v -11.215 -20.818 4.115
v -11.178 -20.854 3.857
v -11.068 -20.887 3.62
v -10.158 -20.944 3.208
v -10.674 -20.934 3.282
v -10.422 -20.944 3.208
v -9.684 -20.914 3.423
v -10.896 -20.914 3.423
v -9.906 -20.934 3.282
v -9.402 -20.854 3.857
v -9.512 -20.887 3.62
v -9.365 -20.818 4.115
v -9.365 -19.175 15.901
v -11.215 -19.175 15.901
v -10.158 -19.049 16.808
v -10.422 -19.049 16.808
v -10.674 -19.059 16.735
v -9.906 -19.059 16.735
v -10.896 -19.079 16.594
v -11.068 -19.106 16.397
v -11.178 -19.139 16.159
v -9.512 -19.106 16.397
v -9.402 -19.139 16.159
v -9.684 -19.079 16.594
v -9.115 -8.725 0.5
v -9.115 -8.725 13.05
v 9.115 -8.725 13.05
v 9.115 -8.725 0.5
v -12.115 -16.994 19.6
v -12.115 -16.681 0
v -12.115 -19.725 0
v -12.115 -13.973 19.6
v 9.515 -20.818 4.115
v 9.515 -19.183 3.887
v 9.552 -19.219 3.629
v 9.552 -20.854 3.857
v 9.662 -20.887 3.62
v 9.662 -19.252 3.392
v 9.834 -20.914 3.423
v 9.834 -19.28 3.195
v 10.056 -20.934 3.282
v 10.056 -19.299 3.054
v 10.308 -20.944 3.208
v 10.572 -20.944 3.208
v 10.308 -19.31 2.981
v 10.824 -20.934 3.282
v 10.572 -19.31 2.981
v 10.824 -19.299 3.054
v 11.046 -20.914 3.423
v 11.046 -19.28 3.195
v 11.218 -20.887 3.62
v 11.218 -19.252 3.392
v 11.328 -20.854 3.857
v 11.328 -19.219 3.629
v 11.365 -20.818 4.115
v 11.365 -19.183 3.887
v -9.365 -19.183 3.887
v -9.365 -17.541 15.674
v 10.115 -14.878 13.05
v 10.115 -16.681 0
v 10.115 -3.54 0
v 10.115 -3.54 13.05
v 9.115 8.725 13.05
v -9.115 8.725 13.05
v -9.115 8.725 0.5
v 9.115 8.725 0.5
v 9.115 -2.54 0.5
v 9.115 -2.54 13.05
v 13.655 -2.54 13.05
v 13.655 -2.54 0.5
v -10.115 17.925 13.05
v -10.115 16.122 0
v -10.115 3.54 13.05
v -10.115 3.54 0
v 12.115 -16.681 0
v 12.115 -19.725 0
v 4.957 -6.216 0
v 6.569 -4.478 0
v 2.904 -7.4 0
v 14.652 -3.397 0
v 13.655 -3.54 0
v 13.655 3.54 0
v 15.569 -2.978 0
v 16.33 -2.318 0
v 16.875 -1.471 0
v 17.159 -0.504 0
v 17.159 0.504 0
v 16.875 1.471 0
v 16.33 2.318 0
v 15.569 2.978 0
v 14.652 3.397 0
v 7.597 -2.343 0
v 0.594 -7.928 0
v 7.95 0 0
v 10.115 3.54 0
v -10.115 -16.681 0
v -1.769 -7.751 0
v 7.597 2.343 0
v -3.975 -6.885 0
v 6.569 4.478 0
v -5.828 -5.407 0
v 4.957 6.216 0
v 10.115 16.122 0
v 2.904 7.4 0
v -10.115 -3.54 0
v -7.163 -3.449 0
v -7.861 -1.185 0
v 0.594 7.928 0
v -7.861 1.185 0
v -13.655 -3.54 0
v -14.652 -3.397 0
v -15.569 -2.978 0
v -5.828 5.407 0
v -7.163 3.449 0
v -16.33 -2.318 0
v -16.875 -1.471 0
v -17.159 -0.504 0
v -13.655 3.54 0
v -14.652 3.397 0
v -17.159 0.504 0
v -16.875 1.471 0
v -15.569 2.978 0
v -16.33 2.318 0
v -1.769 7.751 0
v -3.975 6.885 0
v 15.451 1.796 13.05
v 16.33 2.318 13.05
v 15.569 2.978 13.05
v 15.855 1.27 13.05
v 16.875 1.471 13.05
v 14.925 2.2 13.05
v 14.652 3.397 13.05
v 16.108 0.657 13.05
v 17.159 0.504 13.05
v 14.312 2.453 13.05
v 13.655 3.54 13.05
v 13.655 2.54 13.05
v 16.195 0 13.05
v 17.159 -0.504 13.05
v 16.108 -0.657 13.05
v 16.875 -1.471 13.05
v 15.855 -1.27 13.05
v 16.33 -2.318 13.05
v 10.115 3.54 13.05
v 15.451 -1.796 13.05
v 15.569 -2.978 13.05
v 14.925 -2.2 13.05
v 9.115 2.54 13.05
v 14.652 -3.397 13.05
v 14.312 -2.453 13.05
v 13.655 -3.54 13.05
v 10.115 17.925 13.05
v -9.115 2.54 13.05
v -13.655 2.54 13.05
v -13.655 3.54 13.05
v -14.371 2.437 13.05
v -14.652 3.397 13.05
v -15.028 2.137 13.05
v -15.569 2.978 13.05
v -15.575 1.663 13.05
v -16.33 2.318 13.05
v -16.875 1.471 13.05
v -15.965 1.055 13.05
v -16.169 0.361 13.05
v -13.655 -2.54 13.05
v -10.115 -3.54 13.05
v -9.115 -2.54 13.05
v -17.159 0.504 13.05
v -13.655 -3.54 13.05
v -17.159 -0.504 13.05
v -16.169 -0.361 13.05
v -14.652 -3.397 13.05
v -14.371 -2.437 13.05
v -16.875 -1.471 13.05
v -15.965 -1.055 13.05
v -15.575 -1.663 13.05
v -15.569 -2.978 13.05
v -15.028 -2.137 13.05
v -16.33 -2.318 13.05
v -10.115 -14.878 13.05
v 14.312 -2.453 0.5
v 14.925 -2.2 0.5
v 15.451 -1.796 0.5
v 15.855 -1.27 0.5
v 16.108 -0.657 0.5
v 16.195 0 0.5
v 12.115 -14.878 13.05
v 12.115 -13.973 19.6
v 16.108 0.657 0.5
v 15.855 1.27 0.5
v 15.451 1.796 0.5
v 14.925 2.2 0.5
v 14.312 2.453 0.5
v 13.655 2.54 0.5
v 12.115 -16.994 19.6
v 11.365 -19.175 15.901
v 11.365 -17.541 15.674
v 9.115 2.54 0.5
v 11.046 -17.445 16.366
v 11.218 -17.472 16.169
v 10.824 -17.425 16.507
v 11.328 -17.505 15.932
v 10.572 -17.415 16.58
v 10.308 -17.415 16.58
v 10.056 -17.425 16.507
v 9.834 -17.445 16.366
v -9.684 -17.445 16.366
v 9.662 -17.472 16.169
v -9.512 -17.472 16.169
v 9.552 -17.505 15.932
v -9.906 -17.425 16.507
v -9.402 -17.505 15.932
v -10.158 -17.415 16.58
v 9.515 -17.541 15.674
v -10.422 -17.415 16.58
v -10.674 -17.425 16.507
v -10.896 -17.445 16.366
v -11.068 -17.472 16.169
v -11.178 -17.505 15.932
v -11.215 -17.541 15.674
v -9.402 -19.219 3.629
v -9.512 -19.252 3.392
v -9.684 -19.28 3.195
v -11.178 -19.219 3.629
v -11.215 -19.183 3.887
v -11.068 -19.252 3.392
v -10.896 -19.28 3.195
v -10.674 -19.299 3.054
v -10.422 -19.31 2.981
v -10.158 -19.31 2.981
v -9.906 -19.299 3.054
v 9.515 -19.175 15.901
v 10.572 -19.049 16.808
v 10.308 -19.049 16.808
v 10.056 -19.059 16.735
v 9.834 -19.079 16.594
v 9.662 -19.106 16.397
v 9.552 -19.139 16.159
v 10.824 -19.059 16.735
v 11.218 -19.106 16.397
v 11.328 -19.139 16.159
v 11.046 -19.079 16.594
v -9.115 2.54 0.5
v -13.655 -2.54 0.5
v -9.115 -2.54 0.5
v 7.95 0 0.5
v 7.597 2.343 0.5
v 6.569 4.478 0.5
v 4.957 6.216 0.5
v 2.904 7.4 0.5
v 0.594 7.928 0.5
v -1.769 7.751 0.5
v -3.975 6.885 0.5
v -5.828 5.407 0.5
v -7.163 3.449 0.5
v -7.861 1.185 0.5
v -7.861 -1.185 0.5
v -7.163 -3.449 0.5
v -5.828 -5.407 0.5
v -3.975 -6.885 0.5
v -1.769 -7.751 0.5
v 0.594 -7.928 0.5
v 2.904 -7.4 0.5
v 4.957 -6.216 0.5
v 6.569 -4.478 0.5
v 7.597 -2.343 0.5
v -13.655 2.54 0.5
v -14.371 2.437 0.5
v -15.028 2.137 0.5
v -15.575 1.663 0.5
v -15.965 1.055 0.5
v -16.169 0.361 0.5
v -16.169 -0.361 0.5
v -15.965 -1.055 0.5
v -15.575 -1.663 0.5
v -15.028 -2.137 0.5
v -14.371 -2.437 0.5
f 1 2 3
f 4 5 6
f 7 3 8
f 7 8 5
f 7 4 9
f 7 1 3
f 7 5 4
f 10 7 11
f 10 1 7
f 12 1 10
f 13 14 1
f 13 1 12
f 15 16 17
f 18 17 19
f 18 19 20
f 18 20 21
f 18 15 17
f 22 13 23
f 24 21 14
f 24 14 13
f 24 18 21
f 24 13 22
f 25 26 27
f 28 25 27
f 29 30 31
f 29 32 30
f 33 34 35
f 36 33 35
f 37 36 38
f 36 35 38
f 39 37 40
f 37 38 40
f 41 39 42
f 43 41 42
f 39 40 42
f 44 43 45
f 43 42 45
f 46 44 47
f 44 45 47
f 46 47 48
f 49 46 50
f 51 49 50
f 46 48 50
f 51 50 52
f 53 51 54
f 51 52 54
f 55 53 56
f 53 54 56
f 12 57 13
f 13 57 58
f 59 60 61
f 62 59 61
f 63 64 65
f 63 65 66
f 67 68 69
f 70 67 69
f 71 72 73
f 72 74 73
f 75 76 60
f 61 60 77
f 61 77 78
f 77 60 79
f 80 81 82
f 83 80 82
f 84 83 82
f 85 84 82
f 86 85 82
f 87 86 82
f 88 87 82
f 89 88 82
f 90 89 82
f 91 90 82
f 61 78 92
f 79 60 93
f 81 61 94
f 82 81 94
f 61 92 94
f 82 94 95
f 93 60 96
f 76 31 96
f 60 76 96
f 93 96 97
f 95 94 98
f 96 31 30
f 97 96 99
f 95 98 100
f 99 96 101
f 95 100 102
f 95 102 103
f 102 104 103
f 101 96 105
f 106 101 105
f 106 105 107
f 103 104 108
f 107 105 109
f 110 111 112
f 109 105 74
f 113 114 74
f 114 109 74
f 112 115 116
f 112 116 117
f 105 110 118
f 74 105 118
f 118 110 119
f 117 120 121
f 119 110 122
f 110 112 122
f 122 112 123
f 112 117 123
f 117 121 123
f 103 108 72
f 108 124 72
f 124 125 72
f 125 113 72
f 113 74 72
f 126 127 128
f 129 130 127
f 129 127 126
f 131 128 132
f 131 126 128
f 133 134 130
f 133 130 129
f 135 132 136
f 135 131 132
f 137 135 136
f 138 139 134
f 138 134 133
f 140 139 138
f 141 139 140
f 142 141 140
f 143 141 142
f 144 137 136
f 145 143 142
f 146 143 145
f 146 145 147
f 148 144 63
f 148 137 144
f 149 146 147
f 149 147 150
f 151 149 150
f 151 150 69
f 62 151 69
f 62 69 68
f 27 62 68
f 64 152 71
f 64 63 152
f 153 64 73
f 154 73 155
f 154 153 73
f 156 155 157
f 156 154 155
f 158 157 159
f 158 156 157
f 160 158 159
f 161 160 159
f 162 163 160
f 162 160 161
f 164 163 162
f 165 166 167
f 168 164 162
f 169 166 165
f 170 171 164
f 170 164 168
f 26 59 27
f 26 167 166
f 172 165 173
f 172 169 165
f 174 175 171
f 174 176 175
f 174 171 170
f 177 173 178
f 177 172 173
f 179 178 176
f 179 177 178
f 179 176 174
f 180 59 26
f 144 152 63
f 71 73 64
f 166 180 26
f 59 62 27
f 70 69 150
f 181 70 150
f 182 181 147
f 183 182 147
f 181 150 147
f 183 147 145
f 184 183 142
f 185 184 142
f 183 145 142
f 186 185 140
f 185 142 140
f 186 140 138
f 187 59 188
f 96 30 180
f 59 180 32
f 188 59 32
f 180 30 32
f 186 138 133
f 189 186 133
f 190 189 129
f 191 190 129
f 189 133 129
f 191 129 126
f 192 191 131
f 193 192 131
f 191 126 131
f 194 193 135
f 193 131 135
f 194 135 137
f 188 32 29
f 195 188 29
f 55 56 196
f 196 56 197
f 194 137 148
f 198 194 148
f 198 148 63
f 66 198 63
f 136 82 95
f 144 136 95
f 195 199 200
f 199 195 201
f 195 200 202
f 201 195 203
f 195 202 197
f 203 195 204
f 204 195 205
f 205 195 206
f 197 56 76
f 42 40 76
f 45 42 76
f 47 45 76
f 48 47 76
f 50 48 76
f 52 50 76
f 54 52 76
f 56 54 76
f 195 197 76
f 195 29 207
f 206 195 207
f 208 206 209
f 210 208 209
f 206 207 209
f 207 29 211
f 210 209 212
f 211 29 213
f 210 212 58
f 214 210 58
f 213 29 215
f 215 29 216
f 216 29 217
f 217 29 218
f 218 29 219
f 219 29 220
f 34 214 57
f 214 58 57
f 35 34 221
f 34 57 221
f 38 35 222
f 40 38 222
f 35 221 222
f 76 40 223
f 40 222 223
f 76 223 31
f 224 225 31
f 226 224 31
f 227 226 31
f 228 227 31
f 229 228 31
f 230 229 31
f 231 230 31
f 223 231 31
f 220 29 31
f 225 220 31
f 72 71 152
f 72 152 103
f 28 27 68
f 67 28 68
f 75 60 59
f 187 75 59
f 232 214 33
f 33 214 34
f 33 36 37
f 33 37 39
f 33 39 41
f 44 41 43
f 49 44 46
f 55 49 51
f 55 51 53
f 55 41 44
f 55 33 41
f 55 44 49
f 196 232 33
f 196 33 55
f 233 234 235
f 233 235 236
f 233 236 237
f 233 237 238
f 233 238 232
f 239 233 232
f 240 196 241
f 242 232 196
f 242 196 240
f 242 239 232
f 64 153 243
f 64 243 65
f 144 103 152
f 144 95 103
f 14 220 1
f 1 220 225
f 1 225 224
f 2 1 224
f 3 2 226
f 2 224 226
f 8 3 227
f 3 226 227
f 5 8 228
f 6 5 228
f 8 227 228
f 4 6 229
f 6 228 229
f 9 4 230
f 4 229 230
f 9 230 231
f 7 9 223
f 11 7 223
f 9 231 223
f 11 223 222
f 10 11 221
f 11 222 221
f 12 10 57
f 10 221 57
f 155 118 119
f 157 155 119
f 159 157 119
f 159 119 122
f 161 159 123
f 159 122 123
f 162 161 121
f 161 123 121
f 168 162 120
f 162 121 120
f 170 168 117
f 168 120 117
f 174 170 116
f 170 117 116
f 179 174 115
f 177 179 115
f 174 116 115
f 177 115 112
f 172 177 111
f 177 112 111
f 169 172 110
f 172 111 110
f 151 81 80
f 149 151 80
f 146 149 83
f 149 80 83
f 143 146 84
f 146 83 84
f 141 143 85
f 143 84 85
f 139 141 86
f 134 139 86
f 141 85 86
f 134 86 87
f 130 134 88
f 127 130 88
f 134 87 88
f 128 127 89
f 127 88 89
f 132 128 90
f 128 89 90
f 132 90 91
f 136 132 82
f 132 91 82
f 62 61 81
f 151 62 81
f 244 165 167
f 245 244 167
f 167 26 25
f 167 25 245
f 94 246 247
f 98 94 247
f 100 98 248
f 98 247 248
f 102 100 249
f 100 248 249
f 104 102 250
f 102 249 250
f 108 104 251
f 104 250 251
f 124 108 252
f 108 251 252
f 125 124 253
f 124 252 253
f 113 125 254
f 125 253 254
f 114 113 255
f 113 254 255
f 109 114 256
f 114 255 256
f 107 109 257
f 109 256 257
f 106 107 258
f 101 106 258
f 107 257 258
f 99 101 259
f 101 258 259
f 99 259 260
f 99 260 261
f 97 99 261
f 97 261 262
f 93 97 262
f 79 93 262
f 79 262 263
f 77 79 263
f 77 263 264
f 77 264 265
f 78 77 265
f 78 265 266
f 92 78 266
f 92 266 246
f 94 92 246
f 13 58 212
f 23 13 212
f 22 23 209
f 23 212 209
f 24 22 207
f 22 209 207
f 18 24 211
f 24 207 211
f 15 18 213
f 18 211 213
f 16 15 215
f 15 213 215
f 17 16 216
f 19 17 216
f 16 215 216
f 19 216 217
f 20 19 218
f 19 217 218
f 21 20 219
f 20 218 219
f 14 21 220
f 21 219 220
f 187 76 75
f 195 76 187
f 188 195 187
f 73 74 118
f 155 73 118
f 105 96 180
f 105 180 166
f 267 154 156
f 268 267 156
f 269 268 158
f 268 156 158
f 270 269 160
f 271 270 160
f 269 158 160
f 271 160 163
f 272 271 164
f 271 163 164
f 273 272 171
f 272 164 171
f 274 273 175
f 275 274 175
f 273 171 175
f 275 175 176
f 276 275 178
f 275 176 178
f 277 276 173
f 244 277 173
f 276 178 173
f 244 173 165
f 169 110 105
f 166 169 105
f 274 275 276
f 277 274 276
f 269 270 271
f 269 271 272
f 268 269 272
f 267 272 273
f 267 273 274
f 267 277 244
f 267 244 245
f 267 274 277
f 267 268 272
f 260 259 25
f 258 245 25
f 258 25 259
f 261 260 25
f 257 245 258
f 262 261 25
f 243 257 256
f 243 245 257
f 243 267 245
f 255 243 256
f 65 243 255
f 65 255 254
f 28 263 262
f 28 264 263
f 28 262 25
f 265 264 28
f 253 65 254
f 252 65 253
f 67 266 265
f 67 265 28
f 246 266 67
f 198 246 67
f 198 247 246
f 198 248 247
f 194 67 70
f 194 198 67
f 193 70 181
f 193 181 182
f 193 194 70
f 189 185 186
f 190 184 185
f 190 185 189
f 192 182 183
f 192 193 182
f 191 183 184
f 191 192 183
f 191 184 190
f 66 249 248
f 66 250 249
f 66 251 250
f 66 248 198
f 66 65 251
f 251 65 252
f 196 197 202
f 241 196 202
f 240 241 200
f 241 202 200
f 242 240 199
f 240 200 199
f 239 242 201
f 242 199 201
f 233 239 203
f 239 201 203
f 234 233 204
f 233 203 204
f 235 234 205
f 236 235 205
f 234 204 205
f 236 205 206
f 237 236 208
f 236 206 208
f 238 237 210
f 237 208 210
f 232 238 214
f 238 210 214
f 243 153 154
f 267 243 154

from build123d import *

# Parameters (mm, degrees)
F0_W      = 20.23
F0_H      = 6.185
F1_DEPTH  = 13.05
F2_W      = 18.23
F2_H      = 17.45
F3_DEPTH  = 12.55
F5_DEPTH  = 12.55
F6_R      = 7.95
F7_DEPTH  = 0.501
F8_W      = 20.23
F8_H      = 13.05
F9_DEPTH  = 10
F10_W     = 20.23
F10_H     = 9.9667743579
F11_DEPTH = 25
F13_DEPTH = 27.311
F15_DEPTH = 27.311
F17_W     = 20.23
F17_H     = 13.05
F18_DEPTH = 8.2
F20_DEPTH = 25
F22_DEPTH = 2
F23_DEPTH = 2
F25_DEPTH = 29.311
F27_DEPTH = 1.65


with BuildPart() as f1:
    # F0 (on Top) → F1 (new body)
    with BuildSketch(Plane.XY):
        with Locations((0, -6.6325)):
            Rectangle(F0_W, F0_H)
        Polygon((-10.115, -3.54), (10.115, -3.54), (10.115, 0), (10.115, 3.54), (-10.115, 3.54), (-10.115, 0), align=None)
        with BuildLine():
            Line((10.115, 0), (10.115, -3.54))
            Line((10.115, -3.54), (13.655, -3.54))
            ThreePointArc((13.655, -3.54), (11.1518419946, -2.5031580054), (10.115, 0))
        make_face()
        with BuildLine():
            Line((-13.655, -3.54), (-10.115, -3.54))
            Line((-10.115, -3.54), (-10.115, 0))
            ThreePointArc((-10.115, 0), (-11.1518419946, -2.5031580054), (-13.655, -3.54))
        make_face()
        with BuildLine():
            Line((10.115, 3.54), (10.115, 0))
            ThreePointArc((10.115, 0), (11.1518419946, 2.5031580054), (13.655, 3.54))
            Line((13.655, 3.54), (10.115, 3.54))
        make_face()
        with BuildLine():
            ThreePointArc((13.655, 3.54), (11.1518419946, 2.5031580054), (10.115, 0))
            ThreePointArc((10.115, 0), (11.1518419946, -2.5031580054), (13.655, -3.54))
            Line((13.655, -3.54), (13.655, 3.54))
        make_face()
        with BuildLine():
            Line((13.655, 3.54), (13.655, -3.54))
            ThreePointArc((13.655, -3.54), (16.1581580054, -2.5031580054), (17.195, 0))
            ThreePointArc((17.195, 0), (16.1581580054, 2.5031580054), (13.655, 3.54))
        make_face()
        with BuildLine():
            ThreePointArc((-13.655, 3.54), (-11.1518419946, 2.5031580054), (-10.115, 0))
            Line((-10.115, 0), (-10.115, 3.54))
            Line((-10.115, 3.54), (-13.655, 3.54))
        make_face()
        with BuildLine():
            ThreePointArc((-13.655, -3.54), (-11.1518419946, -2.5031580054), (-10.115, 0))
            ThreePointArc((-10.115, 0), (-11.1518419946, 2.5031580054), (-13.655, 3.54))
            Line((-13.655, 3.54), (-13.655, -3.54))
        make_face()
        with BuildLine():
            ThreePointArc((-13.655, 3.54), (-17.195, 0), (-13.655, -3.54))
            Line((-13.655, -3.54), (-13.655, 3.54))
        make_face()
        with Locations((0, 6.6325)):
            Rectangle(F0_W, F0_H)
    extrude(amount=F1_DEPTH)

    # F2 (on face) → F3 (cut)
    with BuildSketch(Plane.XY.offset(13.05)):
        Rectangle(F2_W, F2_H)
    extrude(amount=-F3_DEPTH, mode=Mode.SUBTRACT)

    # F4 (on face) → F5 (cut)
    with BuildSketch(Plane.XY.offset(13.05)):
        with BuildLine():
            ThreePointArc((-13.655, -2.54), (-11.8589487758, -1.7960512242), (-11.115, 0))
            ThreePointArc((-11.115, 0), (-11.8589487758, 1.7960512242), (-13.655, 2.54))
            Line((-13.655, 2.54), (-13.655, -2.54))
        make_face()
        with BuildLine():
            ThreePointArc((-13.655, 2.54), (-11.8589487758, 1.7960512242), (-11.115, 0))
            ThreePointArc((-11.115, 0), (-11.8589487758, -1.7960512242), (-13.655, -2.54))
            Line((-13.655, -2.54), (13.655, -2.54))
            ThreePointArc((13.655, -2.54), (11.115, 0), (13.655, 2.54))
            Line((13.655, 2.54), (-13.655, 2.54))
        make_face()
        with BuildLine():
            Line((-13.655, -2.54), (-13.655, 2.54))
            ThreePointArc((-13.655, 2.54), (-16.195, 0), (-13.655, -2.54))
        make_face()
        with BuildLine():
            Line((13.655, -2.54), (13.655, 2.54))
            ThreePointArc((13.655, 2.54), (11.115, 0), (13.655, -2.54))
        make_face()
        with BuildLine():
            ThreePointArc((16.195, 0), (15.4510512242, 1.7960512242), (13.655, 2.54))
            Line((13.655, 2.54), (13.655, -2.54))
            ThreePointArc((13.655, -2.54), (15.4510512242, -1.7960512242), (16.195, 0))
        make_face()
    extrude(amount=-F5_DEPTH, mode=Mode.SUBTRACT)

    # F6 (on face) → F7 (cut, through all)
    with BuildSketch(Plane.XY.offset(0.5)):
        Circle(F6_R)
    extrude(amount=-F7_DEPTH, mode=Mode.SUBTRACT)

    # F8 (on face) → F9 (join)
    with BuildSketch(Plane.XZ.offset(9.725)):
        with Locations((0, 6.525)):
            Rectangle(F8_W, F8_H)
    extrude(amount=F9_DEPTH)

    # F10 (on face) → F11 (join)
    with BuildSketch(Plane.XY.offset(13.05)):
        with Locations((0, -14.7416128211)):
            Rectangle(F10_W, F10_H)
    extrude(amount=F11_DEPTH)

    # F12 (on face) → F13 (cut, through all)
    with BuildSketch(Plane(origin=(-10.115, 0, 0), x_dir=(0, -1, 0), z_dir=(-1, 0, 0))):
        Polygon((19.725, 38.05), (14.4232781604, 38.05), (19.725, 0), align=None)
    extrude(amount=-F13_DEPTH, mode=Mode.SUBTRACT)

    # F14 (on face) → F15 (cut, through all)
    with BuildSketch(Plane(origin=(-10.115, 0, 0), x_dir=(0, -1, 0), z_dir=(-1, 0, 0))):
        Polygon((9.7582256421, 13.05), (14.8776879954, 13.05), (11.4232781604, 38.05), (9.7582256421, 38.05), align=None)
    extrude(amount=-F15_DEPTH, mode=Mode.SUBTRACT)

    # F17 (on face) → F18 (join)
    with BuildSketch(Plane(origin=(0, 9.725, 0), x_dir=(-1, 0, 0), z_dir=(0, 1, 0))):
        with Locations((0, 6.525)):
            Rectangle(F17_W, F17_H)
    extrude(amount=F18_DEPTH)

    # F19 (on face) → F20 (cut)
    with BuildSketch(Plane.YZ.offset(10.115)):
        Polygon((17.925, 0), (17.925, 13.05), (16.1217980661, 0), align=None)
    extrude(amount=-F20_DEPTH, mode=Mode.SUBTRACT)

    # F21 (on face) → F22 (join)
    with BuildSketch(Plane(origin=(-10.115, 0, 0), x_dir=(0, -1, 0), z_dir=(-1, 0, 0))):
        Polygon((19.725, 0), (14.4232781604, 38.05), (11.4232781604, 38.05), (16.6808899293, 0), align=None)
    extrude(amount=F22_DEPTH)

    # F16 (on face) → F23 (join)
    with BuildSketch(Plane.YZ.offset(10.115)):
        Polygon((-11.4232781604, 38.05), (-14.4232781604, 38.05), (-19.725, 0), (-16.6808899293, 0), (-14.8776879954, 13.05), align=None)
    extrude(amount=F23_DEPTH)

    # F24 (on face) → F25 (cut, through all)
    with BuildSketch(Plane(origin=(-12.115, 0, 0), x_dir=(0, -1, 0), z_dir=(-1, 0, 0))):
        Polygon((11.4232781604, 38.05), (13.9726326186, 19.6), (16.9940210761, 19.6), (14.4232781604, 38.05), align=None)
    extrude(amount=-F25_DEPTH, mode=Mode.SUBTRACT)

    # F26 (on face) → F27 (join)
    with BuildSketch(Plane(origin=(0, -19.349343601, 2.6960535493), x_dir=(1, 0, 0), z_dir=(0, -0.9904318834, 0.1380024795))):
        with BuildLine():
            ThreePointArc((-11.215, 13.1029010909), (-10.29, 12.1779010909), (-9.365, 13.1029010909))
            ThreePointArc((-9.365, 13.1029010909), (-10.29, 14.0279010909), (-11.215, 13.1029010909))
        make_face()
        with BuildLine():
            Line((-9.365, 1.2029010909), (-9.365, 13.1029010909))
            ThreePointArc((-9.365, 13.1029010909), (-10.29, 12.1779010909), (-11.215, 13.1029010909))
            Line((-11.215, 13.1029010909), (-11.215, 1.2029010909))
            ThreePointArc((-11.215, 1.2029010909), (-10.29, 2.1279010909), (-9.365, 1.2029010909))
        make_face()
        with BuildLine():
            ThreePointArc((-11.215, 1.2029010909), (-10.29, 0.2779010909), (-9.365, 1.2029010909))
            ThreePointArc((-9.365, 1.2029010909), (-10.29, 2.1279010909), (-11.215, 1.2029010909))
        make_face()
        with BuildLine():
            ThreePointArc((9.515, 13.1029010909), (10.44, 12.1779010909), (11.365, 13.1029010909))
            ThreePointArc((11.365, 13.1029010909), (10.44, 14.0279010909), (9.515, 13.1029010909))
        make_face()
        with BuildLine():
            Line((11.365, 1.2029010909), (11.365, 13.1029010909))
            ThreePointArc((11.365, 13.1029010909), (10.44, 12.1779010909), (9.515, 13.1029010909))
            Line((9.515, 13.1029010909), (9.515, 1.2029010909))
            ThreePointArc((9.515, 1.2029010909), (10.44, 2.1279010909), (11.365, 1.2029010909))
        make_face()
        with BuildLine():
            ThreePointArc((9.515, 1.2029010909), (10.44, 0.2779010909), (11.365, 1.2029010909))
            ThreePointArc((11.365, 1.2029010909), (10.44, 2.1279010909), (9.515, 1.2029010909))
        make_face()
    extrude(amount=F27_DEPTH)


solid = f1.part
